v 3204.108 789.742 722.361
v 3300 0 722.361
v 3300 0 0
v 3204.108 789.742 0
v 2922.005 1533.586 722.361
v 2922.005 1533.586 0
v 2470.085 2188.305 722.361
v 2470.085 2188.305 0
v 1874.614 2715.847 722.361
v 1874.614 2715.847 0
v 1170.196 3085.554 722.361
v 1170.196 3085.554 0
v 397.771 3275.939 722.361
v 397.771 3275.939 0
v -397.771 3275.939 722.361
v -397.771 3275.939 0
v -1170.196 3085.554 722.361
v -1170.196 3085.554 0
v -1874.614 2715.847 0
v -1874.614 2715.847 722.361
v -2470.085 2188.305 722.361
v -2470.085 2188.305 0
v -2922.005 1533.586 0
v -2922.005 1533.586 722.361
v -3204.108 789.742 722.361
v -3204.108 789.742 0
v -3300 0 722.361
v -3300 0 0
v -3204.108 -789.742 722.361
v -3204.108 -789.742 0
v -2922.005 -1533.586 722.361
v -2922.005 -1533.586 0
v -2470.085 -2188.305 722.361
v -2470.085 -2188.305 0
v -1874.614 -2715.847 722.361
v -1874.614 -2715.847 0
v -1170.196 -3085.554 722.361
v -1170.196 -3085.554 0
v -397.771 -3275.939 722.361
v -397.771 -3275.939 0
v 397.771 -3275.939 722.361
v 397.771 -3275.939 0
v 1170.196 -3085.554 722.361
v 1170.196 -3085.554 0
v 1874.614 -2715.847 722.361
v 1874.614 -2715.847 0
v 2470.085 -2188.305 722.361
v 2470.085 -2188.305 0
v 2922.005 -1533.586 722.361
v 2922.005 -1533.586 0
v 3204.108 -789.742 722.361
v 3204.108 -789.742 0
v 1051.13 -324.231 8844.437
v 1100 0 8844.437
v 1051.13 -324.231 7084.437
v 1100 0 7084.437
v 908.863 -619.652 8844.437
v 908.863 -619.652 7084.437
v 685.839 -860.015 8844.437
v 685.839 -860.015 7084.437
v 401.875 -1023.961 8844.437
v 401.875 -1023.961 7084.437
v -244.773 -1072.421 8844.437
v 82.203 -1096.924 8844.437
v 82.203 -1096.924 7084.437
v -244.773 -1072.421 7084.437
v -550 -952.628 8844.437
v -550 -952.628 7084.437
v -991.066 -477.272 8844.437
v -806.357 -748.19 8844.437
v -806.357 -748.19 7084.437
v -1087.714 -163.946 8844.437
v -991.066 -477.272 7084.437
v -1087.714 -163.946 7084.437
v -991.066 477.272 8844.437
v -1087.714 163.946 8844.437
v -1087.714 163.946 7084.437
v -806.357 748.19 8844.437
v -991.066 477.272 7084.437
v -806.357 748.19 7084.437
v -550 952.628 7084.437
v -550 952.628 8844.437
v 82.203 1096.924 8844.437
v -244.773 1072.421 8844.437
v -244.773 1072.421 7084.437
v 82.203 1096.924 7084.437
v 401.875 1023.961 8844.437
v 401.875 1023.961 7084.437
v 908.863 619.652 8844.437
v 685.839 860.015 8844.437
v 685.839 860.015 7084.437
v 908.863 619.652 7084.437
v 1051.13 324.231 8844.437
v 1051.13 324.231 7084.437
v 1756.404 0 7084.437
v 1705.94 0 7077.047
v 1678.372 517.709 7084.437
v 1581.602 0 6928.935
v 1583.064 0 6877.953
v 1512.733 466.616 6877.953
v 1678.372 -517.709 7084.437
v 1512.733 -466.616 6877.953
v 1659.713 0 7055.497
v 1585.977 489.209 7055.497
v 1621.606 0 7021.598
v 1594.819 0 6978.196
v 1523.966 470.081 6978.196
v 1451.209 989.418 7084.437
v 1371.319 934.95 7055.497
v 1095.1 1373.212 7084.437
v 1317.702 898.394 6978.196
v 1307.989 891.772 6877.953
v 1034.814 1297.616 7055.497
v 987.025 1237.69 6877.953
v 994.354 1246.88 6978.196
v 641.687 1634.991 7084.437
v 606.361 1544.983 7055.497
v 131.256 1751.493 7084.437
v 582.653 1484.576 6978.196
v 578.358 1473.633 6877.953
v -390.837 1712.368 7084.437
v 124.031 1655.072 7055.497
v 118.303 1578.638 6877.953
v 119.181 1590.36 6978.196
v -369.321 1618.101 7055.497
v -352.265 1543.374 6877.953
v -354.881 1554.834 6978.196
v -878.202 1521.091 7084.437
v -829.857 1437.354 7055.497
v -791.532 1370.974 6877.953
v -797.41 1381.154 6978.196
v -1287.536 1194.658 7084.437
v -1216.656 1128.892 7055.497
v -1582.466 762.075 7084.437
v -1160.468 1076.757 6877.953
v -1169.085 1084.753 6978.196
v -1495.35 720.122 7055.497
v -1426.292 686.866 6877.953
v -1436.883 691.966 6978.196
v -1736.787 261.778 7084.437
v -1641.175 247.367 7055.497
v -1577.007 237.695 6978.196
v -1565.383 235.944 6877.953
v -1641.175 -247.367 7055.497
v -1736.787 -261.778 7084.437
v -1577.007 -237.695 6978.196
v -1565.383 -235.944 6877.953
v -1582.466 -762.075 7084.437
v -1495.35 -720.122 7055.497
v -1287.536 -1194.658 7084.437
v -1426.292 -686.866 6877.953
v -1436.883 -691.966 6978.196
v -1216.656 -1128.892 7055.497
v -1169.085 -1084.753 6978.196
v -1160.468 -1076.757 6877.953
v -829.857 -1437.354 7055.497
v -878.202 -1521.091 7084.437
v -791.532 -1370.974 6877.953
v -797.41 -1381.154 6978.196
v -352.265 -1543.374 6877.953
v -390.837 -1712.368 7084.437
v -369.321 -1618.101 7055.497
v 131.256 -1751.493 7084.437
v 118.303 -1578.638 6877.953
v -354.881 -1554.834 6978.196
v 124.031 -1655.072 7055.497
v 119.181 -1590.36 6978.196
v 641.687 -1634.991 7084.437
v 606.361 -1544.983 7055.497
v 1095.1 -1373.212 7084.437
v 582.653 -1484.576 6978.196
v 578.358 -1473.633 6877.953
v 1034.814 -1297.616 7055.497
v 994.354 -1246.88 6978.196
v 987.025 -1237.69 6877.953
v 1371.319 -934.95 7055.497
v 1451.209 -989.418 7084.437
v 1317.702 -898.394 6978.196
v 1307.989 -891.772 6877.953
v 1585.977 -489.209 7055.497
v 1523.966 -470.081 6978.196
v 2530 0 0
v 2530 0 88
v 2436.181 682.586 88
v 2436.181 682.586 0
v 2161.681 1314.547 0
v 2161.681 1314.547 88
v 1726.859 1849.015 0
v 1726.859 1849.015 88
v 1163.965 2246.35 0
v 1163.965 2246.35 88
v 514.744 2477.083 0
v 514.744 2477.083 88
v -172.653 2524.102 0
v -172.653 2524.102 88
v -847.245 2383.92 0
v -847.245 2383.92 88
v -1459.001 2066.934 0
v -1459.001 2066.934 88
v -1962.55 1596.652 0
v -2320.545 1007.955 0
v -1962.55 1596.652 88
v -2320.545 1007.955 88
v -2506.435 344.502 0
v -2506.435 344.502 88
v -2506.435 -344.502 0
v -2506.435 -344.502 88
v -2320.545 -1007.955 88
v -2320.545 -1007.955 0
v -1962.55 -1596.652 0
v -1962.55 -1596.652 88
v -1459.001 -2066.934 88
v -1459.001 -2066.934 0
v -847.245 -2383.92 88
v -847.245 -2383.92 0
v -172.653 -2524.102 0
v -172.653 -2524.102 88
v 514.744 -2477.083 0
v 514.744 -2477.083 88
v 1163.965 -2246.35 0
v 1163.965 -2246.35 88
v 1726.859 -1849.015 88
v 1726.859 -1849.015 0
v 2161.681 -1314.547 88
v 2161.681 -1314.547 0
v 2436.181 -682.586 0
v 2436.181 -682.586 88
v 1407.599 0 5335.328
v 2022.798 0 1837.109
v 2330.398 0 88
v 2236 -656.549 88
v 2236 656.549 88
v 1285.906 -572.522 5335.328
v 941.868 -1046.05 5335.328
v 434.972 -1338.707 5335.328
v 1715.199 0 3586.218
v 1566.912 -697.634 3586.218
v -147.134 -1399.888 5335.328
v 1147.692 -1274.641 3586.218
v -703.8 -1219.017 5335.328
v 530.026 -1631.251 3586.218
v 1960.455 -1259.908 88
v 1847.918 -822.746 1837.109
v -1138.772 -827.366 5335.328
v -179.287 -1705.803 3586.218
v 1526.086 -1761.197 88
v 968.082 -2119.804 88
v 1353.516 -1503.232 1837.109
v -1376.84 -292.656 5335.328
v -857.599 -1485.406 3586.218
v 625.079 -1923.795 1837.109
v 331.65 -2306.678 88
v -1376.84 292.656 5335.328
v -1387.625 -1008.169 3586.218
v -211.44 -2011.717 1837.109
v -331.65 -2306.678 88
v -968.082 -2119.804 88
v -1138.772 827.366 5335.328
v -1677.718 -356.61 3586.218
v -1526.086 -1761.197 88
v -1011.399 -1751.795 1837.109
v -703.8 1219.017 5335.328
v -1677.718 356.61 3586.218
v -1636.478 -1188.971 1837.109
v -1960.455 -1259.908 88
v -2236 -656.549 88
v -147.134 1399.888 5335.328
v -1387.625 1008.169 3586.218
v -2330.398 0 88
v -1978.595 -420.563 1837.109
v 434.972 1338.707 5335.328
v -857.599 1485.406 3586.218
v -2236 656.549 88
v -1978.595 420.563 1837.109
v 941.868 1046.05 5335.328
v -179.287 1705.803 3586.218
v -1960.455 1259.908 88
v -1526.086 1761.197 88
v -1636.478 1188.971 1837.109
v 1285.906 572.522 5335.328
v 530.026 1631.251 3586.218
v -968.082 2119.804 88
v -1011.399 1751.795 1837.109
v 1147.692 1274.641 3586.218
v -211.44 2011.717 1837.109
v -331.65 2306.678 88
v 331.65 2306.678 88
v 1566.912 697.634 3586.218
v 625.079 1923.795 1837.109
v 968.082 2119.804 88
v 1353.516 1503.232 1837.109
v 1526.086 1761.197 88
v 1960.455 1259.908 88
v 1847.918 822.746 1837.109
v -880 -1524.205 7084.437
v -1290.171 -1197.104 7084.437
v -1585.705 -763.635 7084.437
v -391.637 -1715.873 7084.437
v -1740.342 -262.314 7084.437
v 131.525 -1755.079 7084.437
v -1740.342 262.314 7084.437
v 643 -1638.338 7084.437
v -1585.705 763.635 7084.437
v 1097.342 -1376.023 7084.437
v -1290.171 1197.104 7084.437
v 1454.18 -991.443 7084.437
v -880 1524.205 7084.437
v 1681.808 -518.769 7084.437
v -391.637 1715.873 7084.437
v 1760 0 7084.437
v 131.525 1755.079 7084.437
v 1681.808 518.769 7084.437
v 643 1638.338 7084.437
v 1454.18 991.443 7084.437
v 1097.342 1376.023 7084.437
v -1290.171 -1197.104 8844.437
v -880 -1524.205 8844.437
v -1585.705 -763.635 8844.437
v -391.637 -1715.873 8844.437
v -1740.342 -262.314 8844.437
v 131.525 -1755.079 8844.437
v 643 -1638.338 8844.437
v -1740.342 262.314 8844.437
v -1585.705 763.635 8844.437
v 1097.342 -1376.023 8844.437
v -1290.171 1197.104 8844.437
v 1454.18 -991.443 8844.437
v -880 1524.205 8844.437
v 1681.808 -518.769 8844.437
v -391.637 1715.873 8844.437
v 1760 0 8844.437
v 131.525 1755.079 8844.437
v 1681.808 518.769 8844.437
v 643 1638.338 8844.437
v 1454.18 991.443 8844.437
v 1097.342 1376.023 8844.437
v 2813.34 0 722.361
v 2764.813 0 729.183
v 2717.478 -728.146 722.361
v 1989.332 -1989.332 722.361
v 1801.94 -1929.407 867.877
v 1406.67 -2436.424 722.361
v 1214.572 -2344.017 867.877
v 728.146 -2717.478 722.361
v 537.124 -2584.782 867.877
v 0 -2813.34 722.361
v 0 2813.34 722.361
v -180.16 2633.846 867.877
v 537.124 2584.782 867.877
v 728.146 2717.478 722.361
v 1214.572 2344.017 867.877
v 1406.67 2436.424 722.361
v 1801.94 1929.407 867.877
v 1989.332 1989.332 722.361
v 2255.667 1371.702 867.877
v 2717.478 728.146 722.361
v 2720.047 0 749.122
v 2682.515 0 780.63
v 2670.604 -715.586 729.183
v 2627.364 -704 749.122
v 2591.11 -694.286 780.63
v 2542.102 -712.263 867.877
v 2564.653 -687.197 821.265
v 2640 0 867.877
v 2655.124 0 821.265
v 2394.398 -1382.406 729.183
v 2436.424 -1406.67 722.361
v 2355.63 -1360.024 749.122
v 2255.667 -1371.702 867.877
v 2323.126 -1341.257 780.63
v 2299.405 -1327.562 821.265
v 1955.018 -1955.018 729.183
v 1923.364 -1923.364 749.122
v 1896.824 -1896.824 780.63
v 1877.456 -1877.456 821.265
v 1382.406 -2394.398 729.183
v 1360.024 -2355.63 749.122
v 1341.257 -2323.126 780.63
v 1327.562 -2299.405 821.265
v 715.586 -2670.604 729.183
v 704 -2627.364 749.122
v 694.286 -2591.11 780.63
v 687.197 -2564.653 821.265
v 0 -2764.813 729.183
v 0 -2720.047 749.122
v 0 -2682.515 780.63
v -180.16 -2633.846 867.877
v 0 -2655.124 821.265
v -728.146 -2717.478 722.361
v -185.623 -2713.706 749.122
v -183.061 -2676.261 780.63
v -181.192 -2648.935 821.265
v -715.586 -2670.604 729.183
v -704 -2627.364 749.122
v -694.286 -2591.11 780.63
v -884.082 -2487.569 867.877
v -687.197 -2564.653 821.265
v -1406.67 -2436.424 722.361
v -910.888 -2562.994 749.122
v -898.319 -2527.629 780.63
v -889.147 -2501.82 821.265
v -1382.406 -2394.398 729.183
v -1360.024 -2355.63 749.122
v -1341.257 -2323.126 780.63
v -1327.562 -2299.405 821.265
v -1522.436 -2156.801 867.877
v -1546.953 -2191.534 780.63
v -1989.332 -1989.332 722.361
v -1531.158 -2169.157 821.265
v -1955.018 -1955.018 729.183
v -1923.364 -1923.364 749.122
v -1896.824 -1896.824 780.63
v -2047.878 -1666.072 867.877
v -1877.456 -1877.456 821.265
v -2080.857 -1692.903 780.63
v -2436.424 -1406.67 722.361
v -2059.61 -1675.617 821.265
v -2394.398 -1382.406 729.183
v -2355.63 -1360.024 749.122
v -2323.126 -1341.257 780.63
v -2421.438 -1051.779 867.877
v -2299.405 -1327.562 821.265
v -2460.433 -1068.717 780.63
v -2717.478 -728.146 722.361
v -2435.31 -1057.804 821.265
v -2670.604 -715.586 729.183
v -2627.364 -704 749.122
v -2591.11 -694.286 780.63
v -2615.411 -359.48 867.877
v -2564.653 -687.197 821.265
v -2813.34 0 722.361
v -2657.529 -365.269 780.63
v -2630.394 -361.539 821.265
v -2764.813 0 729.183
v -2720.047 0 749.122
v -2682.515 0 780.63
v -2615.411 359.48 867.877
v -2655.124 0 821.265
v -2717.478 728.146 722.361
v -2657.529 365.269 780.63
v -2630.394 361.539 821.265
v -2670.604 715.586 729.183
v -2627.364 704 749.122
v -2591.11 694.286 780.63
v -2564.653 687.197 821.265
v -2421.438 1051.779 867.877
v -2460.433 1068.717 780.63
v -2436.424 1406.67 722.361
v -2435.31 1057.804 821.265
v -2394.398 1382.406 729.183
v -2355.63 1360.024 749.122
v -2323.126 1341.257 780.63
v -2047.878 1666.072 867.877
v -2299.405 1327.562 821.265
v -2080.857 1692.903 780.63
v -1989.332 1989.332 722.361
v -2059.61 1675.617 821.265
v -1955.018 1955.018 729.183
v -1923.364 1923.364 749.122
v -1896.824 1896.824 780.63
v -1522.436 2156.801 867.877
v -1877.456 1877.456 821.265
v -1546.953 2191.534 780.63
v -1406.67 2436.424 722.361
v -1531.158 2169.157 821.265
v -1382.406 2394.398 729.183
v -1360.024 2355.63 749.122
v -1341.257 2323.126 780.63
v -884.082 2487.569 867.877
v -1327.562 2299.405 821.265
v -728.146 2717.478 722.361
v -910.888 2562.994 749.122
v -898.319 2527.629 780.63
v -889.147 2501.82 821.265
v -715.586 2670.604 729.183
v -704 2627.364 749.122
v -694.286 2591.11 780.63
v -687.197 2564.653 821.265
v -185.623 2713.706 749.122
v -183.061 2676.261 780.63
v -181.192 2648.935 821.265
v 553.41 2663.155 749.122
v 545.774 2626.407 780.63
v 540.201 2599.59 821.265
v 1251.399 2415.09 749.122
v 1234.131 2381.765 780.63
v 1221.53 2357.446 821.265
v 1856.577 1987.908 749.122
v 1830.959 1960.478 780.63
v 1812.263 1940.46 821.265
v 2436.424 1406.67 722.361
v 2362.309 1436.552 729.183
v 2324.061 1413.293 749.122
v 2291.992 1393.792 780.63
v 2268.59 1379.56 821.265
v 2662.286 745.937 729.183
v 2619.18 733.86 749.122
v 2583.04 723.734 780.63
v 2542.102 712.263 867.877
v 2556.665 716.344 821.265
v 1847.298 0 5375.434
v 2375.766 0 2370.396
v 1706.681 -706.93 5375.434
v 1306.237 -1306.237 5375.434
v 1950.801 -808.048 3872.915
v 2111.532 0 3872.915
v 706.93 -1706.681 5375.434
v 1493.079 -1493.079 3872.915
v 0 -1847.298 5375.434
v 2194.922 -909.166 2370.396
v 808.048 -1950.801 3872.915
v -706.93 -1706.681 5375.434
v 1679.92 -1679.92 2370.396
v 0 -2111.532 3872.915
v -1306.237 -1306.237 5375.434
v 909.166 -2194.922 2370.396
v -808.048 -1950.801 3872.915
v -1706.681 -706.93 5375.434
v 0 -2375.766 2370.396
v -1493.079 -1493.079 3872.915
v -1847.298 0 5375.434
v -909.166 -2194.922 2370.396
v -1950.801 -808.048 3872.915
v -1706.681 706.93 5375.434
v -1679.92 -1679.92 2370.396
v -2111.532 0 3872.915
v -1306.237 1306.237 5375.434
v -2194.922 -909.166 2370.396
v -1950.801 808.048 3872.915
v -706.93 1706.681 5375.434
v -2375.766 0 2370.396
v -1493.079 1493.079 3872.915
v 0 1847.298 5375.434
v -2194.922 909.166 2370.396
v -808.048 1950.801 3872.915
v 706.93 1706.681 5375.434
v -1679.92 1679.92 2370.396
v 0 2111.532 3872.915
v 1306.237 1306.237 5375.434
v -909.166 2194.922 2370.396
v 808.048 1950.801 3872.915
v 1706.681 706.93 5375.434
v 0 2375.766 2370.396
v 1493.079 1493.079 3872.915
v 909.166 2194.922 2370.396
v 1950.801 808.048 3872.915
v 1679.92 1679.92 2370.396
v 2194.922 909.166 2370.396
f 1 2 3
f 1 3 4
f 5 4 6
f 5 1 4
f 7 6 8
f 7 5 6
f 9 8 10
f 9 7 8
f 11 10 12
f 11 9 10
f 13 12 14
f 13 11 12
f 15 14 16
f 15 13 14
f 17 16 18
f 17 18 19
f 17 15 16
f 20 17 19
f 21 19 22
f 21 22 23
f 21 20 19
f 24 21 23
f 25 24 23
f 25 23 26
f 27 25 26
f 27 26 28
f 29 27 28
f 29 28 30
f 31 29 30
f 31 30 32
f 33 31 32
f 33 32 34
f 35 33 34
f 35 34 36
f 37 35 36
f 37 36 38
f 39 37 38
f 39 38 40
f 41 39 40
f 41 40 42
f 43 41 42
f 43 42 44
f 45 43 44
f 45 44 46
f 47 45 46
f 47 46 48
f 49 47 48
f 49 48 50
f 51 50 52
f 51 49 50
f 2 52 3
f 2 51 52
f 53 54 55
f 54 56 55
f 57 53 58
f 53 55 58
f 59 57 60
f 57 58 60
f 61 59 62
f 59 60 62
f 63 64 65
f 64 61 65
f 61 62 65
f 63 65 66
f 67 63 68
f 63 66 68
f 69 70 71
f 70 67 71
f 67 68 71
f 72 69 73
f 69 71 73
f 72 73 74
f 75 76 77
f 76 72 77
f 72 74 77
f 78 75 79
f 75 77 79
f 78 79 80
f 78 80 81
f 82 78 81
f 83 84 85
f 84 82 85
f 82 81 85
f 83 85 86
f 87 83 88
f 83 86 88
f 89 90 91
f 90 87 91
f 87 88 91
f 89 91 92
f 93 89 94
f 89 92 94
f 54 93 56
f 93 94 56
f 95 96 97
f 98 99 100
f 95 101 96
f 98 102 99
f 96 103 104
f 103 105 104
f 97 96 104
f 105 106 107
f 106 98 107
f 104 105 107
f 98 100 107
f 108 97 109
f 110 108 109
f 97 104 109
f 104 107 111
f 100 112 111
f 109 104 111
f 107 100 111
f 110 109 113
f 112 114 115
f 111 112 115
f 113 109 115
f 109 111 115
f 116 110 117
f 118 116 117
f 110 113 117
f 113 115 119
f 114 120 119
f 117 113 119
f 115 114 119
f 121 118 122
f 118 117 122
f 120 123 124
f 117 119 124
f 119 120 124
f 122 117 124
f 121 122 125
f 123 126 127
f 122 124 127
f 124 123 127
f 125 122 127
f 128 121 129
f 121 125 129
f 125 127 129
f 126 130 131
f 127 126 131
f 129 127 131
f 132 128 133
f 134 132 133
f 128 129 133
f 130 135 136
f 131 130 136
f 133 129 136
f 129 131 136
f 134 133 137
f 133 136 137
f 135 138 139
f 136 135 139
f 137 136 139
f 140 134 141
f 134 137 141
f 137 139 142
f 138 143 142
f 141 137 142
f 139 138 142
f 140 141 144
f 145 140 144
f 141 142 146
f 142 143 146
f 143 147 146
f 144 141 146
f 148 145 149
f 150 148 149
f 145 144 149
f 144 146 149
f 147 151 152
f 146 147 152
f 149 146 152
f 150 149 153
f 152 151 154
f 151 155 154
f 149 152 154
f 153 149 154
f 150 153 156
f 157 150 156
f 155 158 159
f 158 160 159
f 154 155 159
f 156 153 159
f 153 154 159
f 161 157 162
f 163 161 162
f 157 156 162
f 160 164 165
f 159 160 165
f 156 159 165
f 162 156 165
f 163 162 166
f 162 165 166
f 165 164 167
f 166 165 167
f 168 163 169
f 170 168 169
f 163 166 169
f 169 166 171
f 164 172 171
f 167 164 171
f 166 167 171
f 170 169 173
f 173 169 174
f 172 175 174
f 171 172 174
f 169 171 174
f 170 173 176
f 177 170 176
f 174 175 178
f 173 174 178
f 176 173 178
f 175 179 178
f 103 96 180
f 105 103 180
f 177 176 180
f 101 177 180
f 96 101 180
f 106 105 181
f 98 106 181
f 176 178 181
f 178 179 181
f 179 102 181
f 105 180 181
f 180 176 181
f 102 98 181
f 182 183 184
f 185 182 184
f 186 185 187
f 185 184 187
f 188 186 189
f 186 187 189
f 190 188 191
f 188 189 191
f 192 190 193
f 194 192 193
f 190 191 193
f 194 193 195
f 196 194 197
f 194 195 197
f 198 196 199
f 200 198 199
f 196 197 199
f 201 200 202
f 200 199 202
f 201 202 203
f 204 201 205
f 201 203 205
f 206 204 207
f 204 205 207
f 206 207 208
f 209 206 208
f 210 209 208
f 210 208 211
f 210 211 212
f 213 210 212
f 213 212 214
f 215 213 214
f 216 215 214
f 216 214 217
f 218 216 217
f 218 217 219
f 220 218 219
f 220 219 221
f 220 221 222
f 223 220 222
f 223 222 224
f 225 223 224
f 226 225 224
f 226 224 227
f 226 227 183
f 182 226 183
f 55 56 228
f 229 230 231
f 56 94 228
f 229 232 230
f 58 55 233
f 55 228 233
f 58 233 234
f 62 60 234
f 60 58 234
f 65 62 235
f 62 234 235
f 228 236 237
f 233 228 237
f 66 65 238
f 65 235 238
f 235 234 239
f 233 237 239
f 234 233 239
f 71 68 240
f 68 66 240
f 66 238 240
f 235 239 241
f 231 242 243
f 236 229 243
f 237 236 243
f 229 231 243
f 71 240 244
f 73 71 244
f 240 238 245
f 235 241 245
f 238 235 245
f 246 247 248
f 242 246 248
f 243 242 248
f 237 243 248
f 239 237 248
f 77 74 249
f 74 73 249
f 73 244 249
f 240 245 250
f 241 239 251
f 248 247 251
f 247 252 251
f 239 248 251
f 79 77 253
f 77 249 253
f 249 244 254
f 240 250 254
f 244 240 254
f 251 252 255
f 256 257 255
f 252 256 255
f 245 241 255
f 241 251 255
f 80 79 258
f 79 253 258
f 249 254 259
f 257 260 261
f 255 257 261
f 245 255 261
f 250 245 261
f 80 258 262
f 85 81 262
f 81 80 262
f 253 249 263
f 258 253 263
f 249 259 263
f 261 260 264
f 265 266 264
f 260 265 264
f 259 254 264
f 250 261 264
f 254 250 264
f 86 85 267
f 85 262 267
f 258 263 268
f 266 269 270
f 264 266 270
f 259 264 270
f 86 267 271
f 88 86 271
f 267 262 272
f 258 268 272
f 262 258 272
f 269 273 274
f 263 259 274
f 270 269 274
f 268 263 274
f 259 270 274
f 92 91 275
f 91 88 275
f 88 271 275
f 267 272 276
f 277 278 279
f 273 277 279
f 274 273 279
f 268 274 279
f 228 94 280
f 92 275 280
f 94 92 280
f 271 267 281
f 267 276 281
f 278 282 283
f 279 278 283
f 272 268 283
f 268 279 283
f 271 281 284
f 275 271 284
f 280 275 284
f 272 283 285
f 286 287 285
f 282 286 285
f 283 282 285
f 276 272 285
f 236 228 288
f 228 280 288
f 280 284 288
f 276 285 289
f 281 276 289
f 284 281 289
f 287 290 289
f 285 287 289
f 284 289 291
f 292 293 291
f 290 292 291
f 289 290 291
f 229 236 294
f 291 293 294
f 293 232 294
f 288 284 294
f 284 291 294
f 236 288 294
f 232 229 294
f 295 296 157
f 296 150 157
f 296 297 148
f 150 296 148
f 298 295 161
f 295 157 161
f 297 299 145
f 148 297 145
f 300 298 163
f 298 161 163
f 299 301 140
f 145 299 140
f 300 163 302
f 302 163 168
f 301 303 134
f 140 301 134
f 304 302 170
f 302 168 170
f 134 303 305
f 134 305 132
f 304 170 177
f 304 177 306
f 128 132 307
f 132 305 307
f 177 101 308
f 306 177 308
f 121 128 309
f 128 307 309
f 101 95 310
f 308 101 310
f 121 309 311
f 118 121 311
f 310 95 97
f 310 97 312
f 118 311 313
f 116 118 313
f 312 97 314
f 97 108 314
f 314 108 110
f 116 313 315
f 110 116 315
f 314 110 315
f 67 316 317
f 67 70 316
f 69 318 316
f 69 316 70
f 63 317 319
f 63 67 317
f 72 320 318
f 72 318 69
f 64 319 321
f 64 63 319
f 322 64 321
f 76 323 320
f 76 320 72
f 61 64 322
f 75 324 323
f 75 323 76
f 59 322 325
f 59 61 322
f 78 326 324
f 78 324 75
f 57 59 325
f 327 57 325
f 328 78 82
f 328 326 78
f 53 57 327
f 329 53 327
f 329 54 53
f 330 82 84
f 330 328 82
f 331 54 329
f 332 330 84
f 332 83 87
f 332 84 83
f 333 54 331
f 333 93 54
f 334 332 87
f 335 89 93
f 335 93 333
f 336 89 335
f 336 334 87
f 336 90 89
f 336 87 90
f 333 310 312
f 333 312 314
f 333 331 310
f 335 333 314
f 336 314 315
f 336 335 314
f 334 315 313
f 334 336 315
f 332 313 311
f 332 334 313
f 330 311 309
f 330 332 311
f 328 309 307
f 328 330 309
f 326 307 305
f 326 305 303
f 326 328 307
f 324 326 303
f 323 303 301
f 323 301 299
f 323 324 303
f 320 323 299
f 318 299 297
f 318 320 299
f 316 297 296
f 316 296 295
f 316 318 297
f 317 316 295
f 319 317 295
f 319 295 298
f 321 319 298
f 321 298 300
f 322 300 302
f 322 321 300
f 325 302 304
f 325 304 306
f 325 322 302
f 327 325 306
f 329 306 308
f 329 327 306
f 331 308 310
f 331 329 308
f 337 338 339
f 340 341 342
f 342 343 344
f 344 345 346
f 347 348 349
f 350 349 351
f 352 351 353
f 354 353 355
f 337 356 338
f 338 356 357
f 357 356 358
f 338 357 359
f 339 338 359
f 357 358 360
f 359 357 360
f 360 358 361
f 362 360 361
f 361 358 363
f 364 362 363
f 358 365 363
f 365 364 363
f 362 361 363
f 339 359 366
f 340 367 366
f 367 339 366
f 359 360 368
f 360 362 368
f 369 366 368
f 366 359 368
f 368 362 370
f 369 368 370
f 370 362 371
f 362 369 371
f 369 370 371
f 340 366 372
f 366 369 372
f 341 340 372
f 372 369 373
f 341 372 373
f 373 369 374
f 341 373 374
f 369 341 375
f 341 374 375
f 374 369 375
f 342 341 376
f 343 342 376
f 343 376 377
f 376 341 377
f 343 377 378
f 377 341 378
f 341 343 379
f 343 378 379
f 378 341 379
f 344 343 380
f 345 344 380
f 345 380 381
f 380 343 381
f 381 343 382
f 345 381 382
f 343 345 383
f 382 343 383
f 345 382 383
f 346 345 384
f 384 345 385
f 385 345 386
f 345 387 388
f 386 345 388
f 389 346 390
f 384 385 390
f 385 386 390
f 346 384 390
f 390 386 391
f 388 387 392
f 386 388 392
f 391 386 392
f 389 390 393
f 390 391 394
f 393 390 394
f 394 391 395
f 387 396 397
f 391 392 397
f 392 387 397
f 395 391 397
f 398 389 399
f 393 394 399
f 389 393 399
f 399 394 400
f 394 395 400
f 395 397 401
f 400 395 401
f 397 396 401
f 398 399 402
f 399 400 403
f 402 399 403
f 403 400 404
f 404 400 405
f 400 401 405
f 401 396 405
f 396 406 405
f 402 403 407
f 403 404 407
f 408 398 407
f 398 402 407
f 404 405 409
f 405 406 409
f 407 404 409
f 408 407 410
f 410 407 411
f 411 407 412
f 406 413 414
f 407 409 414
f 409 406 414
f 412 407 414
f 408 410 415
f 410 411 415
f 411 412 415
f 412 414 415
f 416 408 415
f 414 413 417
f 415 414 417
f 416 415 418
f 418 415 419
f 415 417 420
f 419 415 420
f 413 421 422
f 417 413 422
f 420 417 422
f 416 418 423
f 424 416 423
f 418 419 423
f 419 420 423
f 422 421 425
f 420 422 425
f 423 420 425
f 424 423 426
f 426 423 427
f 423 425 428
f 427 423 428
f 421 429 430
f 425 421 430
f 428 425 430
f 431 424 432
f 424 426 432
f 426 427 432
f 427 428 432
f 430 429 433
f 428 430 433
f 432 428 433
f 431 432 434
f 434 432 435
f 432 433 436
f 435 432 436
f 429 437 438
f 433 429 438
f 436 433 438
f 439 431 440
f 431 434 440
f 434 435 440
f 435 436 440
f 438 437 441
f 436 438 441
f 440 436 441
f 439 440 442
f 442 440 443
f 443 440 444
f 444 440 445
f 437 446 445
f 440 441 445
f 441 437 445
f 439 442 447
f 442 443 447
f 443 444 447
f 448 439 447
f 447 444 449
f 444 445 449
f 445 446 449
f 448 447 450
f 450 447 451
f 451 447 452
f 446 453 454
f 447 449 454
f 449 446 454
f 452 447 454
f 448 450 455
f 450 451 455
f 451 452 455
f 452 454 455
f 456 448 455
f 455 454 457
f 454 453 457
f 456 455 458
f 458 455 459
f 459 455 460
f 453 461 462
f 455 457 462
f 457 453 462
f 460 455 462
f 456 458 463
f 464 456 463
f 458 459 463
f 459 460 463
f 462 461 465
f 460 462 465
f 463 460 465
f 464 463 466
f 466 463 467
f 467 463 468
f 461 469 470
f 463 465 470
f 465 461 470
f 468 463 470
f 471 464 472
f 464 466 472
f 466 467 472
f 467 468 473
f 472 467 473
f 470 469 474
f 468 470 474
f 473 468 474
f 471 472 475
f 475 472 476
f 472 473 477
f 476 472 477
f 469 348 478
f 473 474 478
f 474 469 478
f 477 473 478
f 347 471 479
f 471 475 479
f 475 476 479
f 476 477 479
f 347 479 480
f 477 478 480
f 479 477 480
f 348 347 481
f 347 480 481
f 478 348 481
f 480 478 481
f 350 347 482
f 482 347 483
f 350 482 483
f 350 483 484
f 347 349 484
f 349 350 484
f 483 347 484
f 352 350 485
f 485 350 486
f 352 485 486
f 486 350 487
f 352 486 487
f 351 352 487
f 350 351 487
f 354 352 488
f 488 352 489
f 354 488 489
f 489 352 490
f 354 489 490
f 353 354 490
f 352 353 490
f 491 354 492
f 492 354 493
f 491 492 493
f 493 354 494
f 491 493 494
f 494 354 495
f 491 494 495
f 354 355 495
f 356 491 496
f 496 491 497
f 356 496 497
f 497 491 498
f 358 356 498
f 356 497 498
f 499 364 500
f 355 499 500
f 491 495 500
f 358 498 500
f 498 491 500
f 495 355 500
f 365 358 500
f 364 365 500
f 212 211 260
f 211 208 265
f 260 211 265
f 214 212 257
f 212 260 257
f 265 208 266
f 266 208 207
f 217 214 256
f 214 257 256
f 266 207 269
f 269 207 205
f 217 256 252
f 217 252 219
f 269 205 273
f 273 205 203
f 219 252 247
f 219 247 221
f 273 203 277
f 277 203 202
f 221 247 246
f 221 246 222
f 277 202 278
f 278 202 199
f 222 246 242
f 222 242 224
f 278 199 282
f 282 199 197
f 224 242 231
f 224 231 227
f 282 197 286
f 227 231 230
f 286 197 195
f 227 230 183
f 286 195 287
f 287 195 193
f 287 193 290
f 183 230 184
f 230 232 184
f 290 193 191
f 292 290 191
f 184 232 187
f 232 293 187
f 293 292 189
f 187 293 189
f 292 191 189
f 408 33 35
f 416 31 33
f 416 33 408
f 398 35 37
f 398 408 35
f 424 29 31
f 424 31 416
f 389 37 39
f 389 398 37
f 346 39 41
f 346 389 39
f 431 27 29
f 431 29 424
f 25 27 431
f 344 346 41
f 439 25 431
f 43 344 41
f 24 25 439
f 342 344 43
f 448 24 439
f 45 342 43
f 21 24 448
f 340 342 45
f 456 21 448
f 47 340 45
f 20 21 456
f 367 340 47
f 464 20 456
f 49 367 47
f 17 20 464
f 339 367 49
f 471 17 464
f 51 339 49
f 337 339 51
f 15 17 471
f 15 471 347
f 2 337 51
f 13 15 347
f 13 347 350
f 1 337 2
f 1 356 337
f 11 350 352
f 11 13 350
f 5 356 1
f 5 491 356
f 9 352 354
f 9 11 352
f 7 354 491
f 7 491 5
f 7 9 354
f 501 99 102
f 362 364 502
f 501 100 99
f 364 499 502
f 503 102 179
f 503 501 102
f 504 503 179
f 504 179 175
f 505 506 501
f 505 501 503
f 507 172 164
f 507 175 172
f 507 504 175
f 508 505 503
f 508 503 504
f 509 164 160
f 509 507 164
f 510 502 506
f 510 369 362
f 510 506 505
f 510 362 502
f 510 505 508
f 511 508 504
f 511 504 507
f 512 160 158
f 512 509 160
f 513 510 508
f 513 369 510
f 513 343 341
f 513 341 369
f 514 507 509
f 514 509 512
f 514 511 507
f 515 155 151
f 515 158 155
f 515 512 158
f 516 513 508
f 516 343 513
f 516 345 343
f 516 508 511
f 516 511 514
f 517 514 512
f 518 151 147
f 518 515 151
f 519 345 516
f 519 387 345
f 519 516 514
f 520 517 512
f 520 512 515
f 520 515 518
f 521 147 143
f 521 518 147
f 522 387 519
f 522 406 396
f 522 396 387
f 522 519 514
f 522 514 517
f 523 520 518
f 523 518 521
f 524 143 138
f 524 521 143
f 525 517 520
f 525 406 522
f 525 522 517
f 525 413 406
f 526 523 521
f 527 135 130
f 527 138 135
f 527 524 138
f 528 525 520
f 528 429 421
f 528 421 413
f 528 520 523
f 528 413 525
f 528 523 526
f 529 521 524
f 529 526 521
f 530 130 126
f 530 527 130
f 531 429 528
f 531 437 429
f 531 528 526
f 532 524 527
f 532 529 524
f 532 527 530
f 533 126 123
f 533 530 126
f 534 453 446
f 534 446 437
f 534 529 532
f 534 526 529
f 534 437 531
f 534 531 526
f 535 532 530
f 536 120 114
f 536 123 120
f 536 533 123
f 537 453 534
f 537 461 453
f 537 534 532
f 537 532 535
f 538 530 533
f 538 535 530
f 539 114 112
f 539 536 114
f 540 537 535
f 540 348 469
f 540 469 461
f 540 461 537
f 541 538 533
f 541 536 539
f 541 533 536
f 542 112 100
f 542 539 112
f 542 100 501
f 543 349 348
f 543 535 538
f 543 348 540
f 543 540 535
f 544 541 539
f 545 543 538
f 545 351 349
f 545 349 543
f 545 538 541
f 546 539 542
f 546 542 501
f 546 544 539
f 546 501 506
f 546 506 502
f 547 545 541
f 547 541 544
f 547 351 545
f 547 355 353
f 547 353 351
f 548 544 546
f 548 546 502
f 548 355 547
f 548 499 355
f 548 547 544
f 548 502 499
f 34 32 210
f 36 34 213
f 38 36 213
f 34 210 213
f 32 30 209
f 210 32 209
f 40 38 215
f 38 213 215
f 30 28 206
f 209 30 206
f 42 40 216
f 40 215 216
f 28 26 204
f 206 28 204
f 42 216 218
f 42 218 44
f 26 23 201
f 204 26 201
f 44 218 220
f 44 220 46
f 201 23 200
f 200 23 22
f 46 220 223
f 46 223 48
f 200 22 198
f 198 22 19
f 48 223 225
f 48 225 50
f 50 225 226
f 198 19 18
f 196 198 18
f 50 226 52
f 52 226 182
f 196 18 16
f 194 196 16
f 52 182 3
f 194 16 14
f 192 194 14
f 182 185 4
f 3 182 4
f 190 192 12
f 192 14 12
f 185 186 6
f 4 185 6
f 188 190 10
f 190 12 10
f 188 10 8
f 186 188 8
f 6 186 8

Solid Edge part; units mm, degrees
sketch "Sketch1" plane through (0, 0, 0) normal (0, -1, 0) x (1, 0, 0)
  line L0 (1583.0645, 6877.9533) -> (2640, 867.8774)
  line L1 (3300, 722.3611) -> (2813.34, 722.3611)
  line L2 (3300, 0) -> (3300, 722.3611)
  line L3 (2530, 0) -> (3300, 0)
  line L4 (2530, 0) -> (2530, 88)
  line L5 (2530, 88) -> (2330.3976, 88)
  line L6 (1100, 7084.4369) -> (2330.3976, 88)
  line L7 (1100, 8844.4369) -> (1100, 7084.4369)
  line L8 (1760, 8844.4369) -> (1100, 8844.4369)
  line L9 (1760, 7084.4369) -> (1760, 8844.4369)
  line L10 (1756.4044, 7084.4369) -> (1760, 7084.4369)
  arc A0 (1756.4044, 7084.4369) -> (1583.0645, 6877.9533) centre (1756.4044, 6908.4369) ccw
  arc A1 (2813.34, 722.3611) -> (2640, 867.8774) centre (2813.34, 898.3611) cw
revolve "RevolvedProtrusion1" add sketch "Sketch1" angle 360 about axis through (0, 0, 0) along (0, 0, 1)
